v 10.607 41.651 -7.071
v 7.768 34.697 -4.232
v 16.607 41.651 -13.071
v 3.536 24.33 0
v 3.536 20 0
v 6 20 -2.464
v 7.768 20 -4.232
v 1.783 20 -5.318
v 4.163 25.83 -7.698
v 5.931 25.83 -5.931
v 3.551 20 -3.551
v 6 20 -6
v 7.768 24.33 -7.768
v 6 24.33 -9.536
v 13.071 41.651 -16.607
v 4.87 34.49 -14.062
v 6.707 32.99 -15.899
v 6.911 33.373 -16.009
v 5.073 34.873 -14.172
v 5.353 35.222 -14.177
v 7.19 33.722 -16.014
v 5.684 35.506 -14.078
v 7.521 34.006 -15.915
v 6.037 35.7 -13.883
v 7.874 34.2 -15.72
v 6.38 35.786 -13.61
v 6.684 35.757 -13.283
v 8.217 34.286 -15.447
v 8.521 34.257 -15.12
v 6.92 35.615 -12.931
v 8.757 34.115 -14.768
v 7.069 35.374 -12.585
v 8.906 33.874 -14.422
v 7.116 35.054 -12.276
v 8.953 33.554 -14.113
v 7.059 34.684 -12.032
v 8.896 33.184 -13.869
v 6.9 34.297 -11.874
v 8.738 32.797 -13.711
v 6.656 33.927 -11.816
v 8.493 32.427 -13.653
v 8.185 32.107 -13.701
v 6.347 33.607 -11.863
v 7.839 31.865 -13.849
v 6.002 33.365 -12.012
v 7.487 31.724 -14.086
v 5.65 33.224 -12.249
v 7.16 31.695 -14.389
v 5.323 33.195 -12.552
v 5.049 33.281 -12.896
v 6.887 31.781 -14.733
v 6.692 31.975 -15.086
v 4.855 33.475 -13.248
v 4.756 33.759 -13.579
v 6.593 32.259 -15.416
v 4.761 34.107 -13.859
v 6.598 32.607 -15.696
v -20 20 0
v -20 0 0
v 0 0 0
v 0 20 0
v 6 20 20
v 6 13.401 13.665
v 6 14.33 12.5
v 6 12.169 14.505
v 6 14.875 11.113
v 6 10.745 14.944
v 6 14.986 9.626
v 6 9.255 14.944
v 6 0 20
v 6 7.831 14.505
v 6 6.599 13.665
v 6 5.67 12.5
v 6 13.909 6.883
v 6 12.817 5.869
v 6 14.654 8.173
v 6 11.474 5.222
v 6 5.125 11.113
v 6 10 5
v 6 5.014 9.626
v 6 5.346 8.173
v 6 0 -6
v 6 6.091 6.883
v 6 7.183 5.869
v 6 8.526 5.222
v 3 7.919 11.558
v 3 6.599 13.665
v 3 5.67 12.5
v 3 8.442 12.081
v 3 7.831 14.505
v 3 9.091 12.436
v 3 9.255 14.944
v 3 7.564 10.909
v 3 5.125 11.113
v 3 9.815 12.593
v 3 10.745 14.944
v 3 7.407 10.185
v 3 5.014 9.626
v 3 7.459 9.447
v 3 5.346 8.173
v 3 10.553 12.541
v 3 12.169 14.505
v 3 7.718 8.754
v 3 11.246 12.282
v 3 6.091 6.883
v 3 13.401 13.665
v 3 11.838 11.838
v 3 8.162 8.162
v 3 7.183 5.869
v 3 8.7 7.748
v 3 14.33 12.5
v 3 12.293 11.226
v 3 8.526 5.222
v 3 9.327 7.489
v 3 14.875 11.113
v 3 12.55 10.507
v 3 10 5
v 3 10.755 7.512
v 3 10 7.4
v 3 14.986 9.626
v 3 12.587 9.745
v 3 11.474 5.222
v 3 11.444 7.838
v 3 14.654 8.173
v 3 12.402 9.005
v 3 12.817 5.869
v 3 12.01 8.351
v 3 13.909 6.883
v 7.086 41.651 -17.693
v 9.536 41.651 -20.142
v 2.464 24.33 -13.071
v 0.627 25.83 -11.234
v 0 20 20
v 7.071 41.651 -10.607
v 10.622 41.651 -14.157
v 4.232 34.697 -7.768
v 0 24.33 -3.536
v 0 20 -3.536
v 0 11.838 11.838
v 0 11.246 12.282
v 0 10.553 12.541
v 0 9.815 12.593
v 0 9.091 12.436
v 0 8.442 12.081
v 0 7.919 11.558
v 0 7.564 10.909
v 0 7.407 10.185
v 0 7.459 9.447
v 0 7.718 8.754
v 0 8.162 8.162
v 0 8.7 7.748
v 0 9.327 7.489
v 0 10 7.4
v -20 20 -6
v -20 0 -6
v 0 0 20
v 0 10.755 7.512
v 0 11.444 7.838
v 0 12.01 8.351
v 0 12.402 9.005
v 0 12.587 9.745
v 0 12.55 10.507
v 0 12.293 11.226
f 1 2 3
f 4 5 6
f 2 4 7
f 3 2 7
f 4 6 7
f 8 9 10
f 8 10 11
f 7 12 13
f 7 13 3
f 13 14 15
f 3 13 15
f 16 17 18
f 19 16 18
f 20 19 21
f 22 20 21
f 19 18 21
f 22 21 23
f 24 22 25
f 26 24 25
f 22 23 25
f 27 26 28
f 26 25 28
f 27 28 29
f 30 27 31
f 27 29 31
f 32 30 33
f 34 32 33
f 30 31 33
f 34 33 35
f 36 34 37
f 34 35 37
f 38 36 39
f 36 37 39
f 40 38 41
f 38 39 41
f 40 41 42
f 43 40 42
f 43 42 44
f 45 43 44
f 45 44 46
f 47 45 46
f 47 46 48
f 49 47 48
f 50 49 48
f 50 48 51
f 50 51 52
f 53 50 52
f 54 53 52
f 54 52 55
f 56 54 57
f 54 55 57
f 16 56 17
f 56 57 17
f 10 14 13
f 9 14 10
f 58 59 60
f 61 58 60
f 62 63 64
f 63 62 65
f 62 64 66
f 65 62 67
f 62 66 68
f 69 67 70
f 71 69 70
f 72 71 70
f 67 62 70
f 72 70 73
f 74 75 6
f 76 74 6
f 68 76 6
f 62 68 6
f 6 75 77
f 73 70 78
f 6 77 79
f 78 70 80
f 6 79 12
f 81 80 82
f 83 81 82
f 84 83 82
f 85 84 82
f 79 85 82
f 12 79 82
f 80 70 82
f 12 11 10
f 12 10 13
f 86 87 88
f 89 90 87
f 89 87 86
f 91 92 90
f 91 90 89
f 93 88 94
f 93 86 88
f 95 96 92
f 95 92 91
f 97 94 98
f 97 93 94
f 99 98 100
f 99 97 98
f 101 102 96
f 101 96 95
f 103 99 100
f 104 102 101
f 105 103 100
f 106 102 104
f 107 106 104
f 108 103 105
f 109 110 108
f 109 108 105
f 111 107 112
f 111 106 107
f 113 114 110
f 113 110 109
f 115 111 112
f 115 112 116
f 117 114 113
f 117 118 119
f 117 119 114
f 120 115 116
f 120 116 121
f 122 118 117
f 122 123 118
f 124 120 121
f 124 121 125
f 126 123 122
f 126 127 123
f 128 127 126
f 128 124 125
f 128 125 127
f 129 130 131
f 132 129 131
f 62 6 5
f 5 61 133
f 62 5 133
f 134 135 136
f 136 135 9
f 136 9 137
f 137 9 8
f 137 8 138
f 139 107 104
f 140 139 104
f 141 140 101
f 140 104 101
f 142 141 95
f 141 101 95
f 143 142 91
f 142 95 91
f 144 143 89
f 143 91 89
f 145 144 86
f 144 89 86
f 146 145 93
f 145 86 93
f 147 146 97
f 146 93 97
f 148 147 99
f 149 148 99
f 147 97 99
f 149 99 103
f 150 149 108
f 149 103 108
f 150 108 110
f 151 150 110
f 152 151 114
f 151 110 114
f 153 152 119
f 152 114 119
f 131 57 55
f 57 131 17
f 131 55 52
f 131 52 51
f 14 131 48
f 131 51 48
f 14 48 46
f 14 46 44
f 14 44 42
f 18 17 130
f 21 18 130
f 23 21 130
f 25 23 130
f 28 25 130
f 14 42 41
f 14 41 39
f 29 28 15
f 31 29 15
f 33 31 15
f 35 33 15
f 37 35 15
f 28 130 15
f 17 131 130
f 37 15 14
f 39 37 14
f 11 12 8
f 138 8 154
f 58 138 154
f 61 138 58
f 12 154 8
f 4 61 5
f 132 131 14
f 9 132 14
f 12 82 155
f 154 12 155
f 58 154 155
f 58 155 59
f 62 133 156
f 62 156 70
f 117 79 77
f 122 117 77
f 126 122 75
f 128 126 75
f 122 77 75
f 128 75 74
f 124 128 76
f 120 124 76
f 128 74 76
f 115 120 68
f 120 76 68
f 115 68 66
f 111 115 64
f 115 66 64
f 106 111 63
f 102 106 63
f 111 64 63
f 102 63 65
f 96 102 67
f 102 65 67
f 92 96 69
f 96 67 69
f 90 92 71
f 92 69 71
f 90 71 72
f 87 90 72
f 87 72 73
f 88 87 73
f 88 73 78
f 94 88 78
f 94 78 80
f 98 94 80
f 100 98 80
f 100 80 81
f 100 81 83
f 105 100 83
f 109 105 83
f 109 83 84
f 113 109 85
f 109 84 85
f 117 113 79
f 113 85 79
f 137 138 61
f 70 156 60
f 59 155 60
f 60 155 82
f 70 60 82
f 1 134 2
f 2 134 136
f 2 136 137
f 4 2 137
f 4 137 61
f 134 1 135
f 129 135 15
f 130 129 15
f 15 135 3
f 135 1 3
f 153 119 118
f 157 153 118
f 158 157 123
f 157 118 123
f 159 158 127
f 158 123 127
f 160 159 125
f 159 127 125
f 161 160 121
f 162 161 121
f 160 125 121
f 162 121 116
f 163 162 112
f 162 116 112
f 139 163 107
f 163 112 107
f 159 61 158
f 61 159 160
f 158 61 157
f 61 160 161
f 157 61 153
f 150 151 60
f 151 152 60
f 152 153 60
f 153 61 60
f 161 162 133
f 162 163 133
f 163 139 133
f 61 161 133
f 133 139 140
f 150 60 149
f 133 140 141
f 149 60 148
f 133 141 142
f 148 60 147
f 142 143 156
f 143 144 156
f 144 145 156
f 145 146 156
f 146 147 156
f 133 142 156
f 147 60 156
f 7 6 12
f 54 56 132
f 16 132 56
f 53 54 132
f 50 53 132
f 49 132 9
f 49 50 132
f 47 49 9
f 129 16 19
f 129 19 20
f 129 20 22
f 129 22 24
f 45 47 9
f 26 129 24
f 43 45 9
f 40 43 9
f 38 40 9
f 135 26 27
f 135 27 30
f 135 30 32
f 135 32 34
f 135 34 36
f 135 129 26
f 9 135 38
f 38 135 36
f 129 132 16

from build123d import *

# Parameters (mm, degrees)
EXTRUDE_2_DEPTH     = 20
CUT_EXTRUDE_1_DEPTH = 20
SKETCH_3_R          = 5
CUT_EXTRUDE_2_DEPTH = 3
SKETCH_4_W          = 6
SKETCH_4_H          = 6
EXTRUDE_3_DEPTH     = 84
CUT_EXTRUDE_3_DEPTH = 84
CUT_EXTRUDE_4_DEPTH = 84
CUT_EXTRUDE_5_DEPTH = 84
SKETCH_9_R          = 1.5
EXTRUDE_4_DEPTH     = 3
CUT_EXTRUDE_6_DEPTH = 6
CUT_EXTRUDE_7_DEPTH = 2.5


with BuildPart() as part:
    # 草图1 → 凸台-拉伸2 (new body)
    with BuildSketch(Plane(origin=(0, 0, 0), x_dir=(1, 0, 0), z_dir=(0, 1, 0))):
        Polygon((0, 0), (0, -20), (6, -20), (6, 6), (-20, 6), (-20, 0), align=None)
    extrude(amount=EXTRUDE_2_DEPTH)

    # 草图2 → 切除-拉伸1 (cut)
    with BuildSketch(Plane(origin=(6, 0, 0), x_dir=(0, 0, -1), z_dir=(1, 0, 0))):
        with BuildLine():
            ThreePointArc((-11.838477631, 11.838477631), (-11.838477631, 8.161522369), (-8.161522369, 8.161522369))
            Line((-8.161522369, 8.161522369), (-11.838477631, 11.838477631))
        make_face()
        with BuildLine():
            Line((-11.838477631, 11.838477631), (-8.161522369, 8.161522369))
            ThreePointArc((-8.161522369, 8.161522369), (-7.597913215, 9.005023076), (-7.4, 10))
            ThreePointArc((-7.4, 10), (-9.005023076, 12.402086785), (-11.838477631, 11.838477631))
        make_face()
    extrude(amount=-CUT_EXTRUDE_1_DEPTH, mode=Mode.SUBTRACT)

    # 草图3 → 切除-拉伸2 (cut)
    with BuildSketch(Plane(origin=(6, 0, 0), x_dir=(0, 0, -1), z_dir=(1, 0, 0))):
        with Locations((-10, 10)):
            Circle(SKETCH_3_R)
    extrude(amount=-CUT_EXTRUDE_2_DEPTH, mode=Mode.SUBTRACT)

    # 草图4 → 凸台-拉伸3 (add)
    with BuildSketch(Plane(origin=(0, 20, 0), x_dir=(1, 0, 0), z_dir=(0, 1, 0))):
        Polygon((65.39696962, 65.39696962), (6, 6), (7.767766953, 4.232233047), (67.164736573, 63.629202667), align=None)
        Polygon((4.232233047, 7.767766953), (6, 6), (65.39696962, 65.39696962), (63.629202667, 67.164736573), align=None)
        Polygon((0, 6), (6, 6), (4.232233047, 7.767766953), (0, 12), align=None)
        with Locations((3, 3)):
            Rectangle(SKETCH_4_W, SKETCH_4_H)
        Polygon((7.767766953, 4.232233047), (6, 6), (6, 0), (12, 0), align=None)
    extrude(amount=EXTRUDE_3_DEPTH)

    # 草图5 → 切除-拉伸3 (cut)
    with BuildSketch(Plane(origin=(-1.767766953, 0, -1.767766953), x_dir=(-0.7071067811865438, 0, 0.7071067811865513), z_dir=(-0.7071067811865513, 0, -0.7071067811865438))):
        Polygon((-8.485281374, 104), (-92.485281374, 104), (-92.485281374, 20), (-8.485281374, 20), (-20.985281374, 41.650635095), (-12.5, 41.650635095), (-8.485281374, 34.696938457), align=None)
        Polygon((0, 104), (-8.485281374, 104), (-8.485281374, 34.696938457), (0, 20), align=None)
    extrude(amount=-CUT_EXTRUDE_3_DEPTH, mode=Mode.SUBTRACT)

    # 草图6 → 切除-拉伸4 (cut)
    with BuildSketch(Plane(origin=(1.767766953, 0, 1.767766953), x_dir=(0.7071067811865438, 0, -0.7071067811865513), z_dir=(0.7071067811865513, 0, 0.7071067811865438))):
        Polygon((8.485281374, 34.696938457), (8.485281374, 20), (0, 20), align=None)
    extrude(amount=CUT_EXTRUDE_4_DEPTH, mode=Mode.SUBTRACT)

    # 草图7 → 切除-拉伸5 (cut)
    with BuildSketch(Plane(origin=(-1.767766953, 0, -1.767766953), x_dir=(-0.7071067811865438, 0, 0.7071067811865513), z_dir=(-0.7071067811865513, 0, -0.7071067811865438))):
        Polygon((-8.485281374, 20), (-2.5, 20), (-2.5, 24.330127019), (-2.5, 104), (-8.485281374, 104), (-8.485281374, 34.696938457), align=None)
        Polygon((-2.5, 24.330127019), (-2.5, 20), (0, 20), align=None)
    extrude(amount=CUT_EXTRUDE_5_DEPTH, mode=Mode.SUBTRACT)

    # 草图9 → 凸台-拉伸4 (add)
    with BuildSketch(Plane(origin=(-1.623724357, 1.325765386, 1.623724357), x_dir=(-0.47434164902525855, 0.3872983346207449, -0.7905694150420924), z_dir=(0.6123724356957914, -0.5, -0.6123724356957978))):
        Polygon((23.059741154, 40.529312363), (27.531877109, 38.293244386), (18.587605199, 20.404700566), (14.115469244, 22.640768543), align=None)
        with Locations(Location((20.823673176, 30.467006465, 0), (0, 0, 333.434948823))):
            Circle(SKETCH_9_R, mode=Mode.SUBTRACT)
    extrude(amount=-EXTRUDE_4_DEPTH)

    # 草图10 → 切除-拉伸6 (cut)
    with BuildSketch(Plane(origin=(-1.767766953, 0, -1.767766953), x_dir=(0.7071067811865438, 0, -0.7071067811865512), z_dir=(0.7071067811865512, 0, 0.7071067811865438))):
        Polygon((17.521179759, 41.650635095), (20.985281374, 41.650635095), (18.387205163, 43.150635095), align=None)
    extrude(amount=-CUT_EXTRUDE_6_DEPTH, mode=Mode.SUBTRACT)

    # 草图11 → 切除-拉伸7 (cut)
    with BuildSketch(Plane(origin=(-1.767766953, 0, -1.767766953), x_dir=(-0.7071067811865438, 0, 0.7071067811865513), z_dir=(-0.7071067811865513, 0, -0.7071067811865438))):
        Polygon((-8.387205163, 25.830127019), (-5.021179759, 20), (-8.485281374, 20), (-10.985281374, 24.330127019), align=None)
    extrude(amount=-CUT_EXTRUDE_7_DEPTH, mode=Mode.SUBTRACT)


solid = part.part
